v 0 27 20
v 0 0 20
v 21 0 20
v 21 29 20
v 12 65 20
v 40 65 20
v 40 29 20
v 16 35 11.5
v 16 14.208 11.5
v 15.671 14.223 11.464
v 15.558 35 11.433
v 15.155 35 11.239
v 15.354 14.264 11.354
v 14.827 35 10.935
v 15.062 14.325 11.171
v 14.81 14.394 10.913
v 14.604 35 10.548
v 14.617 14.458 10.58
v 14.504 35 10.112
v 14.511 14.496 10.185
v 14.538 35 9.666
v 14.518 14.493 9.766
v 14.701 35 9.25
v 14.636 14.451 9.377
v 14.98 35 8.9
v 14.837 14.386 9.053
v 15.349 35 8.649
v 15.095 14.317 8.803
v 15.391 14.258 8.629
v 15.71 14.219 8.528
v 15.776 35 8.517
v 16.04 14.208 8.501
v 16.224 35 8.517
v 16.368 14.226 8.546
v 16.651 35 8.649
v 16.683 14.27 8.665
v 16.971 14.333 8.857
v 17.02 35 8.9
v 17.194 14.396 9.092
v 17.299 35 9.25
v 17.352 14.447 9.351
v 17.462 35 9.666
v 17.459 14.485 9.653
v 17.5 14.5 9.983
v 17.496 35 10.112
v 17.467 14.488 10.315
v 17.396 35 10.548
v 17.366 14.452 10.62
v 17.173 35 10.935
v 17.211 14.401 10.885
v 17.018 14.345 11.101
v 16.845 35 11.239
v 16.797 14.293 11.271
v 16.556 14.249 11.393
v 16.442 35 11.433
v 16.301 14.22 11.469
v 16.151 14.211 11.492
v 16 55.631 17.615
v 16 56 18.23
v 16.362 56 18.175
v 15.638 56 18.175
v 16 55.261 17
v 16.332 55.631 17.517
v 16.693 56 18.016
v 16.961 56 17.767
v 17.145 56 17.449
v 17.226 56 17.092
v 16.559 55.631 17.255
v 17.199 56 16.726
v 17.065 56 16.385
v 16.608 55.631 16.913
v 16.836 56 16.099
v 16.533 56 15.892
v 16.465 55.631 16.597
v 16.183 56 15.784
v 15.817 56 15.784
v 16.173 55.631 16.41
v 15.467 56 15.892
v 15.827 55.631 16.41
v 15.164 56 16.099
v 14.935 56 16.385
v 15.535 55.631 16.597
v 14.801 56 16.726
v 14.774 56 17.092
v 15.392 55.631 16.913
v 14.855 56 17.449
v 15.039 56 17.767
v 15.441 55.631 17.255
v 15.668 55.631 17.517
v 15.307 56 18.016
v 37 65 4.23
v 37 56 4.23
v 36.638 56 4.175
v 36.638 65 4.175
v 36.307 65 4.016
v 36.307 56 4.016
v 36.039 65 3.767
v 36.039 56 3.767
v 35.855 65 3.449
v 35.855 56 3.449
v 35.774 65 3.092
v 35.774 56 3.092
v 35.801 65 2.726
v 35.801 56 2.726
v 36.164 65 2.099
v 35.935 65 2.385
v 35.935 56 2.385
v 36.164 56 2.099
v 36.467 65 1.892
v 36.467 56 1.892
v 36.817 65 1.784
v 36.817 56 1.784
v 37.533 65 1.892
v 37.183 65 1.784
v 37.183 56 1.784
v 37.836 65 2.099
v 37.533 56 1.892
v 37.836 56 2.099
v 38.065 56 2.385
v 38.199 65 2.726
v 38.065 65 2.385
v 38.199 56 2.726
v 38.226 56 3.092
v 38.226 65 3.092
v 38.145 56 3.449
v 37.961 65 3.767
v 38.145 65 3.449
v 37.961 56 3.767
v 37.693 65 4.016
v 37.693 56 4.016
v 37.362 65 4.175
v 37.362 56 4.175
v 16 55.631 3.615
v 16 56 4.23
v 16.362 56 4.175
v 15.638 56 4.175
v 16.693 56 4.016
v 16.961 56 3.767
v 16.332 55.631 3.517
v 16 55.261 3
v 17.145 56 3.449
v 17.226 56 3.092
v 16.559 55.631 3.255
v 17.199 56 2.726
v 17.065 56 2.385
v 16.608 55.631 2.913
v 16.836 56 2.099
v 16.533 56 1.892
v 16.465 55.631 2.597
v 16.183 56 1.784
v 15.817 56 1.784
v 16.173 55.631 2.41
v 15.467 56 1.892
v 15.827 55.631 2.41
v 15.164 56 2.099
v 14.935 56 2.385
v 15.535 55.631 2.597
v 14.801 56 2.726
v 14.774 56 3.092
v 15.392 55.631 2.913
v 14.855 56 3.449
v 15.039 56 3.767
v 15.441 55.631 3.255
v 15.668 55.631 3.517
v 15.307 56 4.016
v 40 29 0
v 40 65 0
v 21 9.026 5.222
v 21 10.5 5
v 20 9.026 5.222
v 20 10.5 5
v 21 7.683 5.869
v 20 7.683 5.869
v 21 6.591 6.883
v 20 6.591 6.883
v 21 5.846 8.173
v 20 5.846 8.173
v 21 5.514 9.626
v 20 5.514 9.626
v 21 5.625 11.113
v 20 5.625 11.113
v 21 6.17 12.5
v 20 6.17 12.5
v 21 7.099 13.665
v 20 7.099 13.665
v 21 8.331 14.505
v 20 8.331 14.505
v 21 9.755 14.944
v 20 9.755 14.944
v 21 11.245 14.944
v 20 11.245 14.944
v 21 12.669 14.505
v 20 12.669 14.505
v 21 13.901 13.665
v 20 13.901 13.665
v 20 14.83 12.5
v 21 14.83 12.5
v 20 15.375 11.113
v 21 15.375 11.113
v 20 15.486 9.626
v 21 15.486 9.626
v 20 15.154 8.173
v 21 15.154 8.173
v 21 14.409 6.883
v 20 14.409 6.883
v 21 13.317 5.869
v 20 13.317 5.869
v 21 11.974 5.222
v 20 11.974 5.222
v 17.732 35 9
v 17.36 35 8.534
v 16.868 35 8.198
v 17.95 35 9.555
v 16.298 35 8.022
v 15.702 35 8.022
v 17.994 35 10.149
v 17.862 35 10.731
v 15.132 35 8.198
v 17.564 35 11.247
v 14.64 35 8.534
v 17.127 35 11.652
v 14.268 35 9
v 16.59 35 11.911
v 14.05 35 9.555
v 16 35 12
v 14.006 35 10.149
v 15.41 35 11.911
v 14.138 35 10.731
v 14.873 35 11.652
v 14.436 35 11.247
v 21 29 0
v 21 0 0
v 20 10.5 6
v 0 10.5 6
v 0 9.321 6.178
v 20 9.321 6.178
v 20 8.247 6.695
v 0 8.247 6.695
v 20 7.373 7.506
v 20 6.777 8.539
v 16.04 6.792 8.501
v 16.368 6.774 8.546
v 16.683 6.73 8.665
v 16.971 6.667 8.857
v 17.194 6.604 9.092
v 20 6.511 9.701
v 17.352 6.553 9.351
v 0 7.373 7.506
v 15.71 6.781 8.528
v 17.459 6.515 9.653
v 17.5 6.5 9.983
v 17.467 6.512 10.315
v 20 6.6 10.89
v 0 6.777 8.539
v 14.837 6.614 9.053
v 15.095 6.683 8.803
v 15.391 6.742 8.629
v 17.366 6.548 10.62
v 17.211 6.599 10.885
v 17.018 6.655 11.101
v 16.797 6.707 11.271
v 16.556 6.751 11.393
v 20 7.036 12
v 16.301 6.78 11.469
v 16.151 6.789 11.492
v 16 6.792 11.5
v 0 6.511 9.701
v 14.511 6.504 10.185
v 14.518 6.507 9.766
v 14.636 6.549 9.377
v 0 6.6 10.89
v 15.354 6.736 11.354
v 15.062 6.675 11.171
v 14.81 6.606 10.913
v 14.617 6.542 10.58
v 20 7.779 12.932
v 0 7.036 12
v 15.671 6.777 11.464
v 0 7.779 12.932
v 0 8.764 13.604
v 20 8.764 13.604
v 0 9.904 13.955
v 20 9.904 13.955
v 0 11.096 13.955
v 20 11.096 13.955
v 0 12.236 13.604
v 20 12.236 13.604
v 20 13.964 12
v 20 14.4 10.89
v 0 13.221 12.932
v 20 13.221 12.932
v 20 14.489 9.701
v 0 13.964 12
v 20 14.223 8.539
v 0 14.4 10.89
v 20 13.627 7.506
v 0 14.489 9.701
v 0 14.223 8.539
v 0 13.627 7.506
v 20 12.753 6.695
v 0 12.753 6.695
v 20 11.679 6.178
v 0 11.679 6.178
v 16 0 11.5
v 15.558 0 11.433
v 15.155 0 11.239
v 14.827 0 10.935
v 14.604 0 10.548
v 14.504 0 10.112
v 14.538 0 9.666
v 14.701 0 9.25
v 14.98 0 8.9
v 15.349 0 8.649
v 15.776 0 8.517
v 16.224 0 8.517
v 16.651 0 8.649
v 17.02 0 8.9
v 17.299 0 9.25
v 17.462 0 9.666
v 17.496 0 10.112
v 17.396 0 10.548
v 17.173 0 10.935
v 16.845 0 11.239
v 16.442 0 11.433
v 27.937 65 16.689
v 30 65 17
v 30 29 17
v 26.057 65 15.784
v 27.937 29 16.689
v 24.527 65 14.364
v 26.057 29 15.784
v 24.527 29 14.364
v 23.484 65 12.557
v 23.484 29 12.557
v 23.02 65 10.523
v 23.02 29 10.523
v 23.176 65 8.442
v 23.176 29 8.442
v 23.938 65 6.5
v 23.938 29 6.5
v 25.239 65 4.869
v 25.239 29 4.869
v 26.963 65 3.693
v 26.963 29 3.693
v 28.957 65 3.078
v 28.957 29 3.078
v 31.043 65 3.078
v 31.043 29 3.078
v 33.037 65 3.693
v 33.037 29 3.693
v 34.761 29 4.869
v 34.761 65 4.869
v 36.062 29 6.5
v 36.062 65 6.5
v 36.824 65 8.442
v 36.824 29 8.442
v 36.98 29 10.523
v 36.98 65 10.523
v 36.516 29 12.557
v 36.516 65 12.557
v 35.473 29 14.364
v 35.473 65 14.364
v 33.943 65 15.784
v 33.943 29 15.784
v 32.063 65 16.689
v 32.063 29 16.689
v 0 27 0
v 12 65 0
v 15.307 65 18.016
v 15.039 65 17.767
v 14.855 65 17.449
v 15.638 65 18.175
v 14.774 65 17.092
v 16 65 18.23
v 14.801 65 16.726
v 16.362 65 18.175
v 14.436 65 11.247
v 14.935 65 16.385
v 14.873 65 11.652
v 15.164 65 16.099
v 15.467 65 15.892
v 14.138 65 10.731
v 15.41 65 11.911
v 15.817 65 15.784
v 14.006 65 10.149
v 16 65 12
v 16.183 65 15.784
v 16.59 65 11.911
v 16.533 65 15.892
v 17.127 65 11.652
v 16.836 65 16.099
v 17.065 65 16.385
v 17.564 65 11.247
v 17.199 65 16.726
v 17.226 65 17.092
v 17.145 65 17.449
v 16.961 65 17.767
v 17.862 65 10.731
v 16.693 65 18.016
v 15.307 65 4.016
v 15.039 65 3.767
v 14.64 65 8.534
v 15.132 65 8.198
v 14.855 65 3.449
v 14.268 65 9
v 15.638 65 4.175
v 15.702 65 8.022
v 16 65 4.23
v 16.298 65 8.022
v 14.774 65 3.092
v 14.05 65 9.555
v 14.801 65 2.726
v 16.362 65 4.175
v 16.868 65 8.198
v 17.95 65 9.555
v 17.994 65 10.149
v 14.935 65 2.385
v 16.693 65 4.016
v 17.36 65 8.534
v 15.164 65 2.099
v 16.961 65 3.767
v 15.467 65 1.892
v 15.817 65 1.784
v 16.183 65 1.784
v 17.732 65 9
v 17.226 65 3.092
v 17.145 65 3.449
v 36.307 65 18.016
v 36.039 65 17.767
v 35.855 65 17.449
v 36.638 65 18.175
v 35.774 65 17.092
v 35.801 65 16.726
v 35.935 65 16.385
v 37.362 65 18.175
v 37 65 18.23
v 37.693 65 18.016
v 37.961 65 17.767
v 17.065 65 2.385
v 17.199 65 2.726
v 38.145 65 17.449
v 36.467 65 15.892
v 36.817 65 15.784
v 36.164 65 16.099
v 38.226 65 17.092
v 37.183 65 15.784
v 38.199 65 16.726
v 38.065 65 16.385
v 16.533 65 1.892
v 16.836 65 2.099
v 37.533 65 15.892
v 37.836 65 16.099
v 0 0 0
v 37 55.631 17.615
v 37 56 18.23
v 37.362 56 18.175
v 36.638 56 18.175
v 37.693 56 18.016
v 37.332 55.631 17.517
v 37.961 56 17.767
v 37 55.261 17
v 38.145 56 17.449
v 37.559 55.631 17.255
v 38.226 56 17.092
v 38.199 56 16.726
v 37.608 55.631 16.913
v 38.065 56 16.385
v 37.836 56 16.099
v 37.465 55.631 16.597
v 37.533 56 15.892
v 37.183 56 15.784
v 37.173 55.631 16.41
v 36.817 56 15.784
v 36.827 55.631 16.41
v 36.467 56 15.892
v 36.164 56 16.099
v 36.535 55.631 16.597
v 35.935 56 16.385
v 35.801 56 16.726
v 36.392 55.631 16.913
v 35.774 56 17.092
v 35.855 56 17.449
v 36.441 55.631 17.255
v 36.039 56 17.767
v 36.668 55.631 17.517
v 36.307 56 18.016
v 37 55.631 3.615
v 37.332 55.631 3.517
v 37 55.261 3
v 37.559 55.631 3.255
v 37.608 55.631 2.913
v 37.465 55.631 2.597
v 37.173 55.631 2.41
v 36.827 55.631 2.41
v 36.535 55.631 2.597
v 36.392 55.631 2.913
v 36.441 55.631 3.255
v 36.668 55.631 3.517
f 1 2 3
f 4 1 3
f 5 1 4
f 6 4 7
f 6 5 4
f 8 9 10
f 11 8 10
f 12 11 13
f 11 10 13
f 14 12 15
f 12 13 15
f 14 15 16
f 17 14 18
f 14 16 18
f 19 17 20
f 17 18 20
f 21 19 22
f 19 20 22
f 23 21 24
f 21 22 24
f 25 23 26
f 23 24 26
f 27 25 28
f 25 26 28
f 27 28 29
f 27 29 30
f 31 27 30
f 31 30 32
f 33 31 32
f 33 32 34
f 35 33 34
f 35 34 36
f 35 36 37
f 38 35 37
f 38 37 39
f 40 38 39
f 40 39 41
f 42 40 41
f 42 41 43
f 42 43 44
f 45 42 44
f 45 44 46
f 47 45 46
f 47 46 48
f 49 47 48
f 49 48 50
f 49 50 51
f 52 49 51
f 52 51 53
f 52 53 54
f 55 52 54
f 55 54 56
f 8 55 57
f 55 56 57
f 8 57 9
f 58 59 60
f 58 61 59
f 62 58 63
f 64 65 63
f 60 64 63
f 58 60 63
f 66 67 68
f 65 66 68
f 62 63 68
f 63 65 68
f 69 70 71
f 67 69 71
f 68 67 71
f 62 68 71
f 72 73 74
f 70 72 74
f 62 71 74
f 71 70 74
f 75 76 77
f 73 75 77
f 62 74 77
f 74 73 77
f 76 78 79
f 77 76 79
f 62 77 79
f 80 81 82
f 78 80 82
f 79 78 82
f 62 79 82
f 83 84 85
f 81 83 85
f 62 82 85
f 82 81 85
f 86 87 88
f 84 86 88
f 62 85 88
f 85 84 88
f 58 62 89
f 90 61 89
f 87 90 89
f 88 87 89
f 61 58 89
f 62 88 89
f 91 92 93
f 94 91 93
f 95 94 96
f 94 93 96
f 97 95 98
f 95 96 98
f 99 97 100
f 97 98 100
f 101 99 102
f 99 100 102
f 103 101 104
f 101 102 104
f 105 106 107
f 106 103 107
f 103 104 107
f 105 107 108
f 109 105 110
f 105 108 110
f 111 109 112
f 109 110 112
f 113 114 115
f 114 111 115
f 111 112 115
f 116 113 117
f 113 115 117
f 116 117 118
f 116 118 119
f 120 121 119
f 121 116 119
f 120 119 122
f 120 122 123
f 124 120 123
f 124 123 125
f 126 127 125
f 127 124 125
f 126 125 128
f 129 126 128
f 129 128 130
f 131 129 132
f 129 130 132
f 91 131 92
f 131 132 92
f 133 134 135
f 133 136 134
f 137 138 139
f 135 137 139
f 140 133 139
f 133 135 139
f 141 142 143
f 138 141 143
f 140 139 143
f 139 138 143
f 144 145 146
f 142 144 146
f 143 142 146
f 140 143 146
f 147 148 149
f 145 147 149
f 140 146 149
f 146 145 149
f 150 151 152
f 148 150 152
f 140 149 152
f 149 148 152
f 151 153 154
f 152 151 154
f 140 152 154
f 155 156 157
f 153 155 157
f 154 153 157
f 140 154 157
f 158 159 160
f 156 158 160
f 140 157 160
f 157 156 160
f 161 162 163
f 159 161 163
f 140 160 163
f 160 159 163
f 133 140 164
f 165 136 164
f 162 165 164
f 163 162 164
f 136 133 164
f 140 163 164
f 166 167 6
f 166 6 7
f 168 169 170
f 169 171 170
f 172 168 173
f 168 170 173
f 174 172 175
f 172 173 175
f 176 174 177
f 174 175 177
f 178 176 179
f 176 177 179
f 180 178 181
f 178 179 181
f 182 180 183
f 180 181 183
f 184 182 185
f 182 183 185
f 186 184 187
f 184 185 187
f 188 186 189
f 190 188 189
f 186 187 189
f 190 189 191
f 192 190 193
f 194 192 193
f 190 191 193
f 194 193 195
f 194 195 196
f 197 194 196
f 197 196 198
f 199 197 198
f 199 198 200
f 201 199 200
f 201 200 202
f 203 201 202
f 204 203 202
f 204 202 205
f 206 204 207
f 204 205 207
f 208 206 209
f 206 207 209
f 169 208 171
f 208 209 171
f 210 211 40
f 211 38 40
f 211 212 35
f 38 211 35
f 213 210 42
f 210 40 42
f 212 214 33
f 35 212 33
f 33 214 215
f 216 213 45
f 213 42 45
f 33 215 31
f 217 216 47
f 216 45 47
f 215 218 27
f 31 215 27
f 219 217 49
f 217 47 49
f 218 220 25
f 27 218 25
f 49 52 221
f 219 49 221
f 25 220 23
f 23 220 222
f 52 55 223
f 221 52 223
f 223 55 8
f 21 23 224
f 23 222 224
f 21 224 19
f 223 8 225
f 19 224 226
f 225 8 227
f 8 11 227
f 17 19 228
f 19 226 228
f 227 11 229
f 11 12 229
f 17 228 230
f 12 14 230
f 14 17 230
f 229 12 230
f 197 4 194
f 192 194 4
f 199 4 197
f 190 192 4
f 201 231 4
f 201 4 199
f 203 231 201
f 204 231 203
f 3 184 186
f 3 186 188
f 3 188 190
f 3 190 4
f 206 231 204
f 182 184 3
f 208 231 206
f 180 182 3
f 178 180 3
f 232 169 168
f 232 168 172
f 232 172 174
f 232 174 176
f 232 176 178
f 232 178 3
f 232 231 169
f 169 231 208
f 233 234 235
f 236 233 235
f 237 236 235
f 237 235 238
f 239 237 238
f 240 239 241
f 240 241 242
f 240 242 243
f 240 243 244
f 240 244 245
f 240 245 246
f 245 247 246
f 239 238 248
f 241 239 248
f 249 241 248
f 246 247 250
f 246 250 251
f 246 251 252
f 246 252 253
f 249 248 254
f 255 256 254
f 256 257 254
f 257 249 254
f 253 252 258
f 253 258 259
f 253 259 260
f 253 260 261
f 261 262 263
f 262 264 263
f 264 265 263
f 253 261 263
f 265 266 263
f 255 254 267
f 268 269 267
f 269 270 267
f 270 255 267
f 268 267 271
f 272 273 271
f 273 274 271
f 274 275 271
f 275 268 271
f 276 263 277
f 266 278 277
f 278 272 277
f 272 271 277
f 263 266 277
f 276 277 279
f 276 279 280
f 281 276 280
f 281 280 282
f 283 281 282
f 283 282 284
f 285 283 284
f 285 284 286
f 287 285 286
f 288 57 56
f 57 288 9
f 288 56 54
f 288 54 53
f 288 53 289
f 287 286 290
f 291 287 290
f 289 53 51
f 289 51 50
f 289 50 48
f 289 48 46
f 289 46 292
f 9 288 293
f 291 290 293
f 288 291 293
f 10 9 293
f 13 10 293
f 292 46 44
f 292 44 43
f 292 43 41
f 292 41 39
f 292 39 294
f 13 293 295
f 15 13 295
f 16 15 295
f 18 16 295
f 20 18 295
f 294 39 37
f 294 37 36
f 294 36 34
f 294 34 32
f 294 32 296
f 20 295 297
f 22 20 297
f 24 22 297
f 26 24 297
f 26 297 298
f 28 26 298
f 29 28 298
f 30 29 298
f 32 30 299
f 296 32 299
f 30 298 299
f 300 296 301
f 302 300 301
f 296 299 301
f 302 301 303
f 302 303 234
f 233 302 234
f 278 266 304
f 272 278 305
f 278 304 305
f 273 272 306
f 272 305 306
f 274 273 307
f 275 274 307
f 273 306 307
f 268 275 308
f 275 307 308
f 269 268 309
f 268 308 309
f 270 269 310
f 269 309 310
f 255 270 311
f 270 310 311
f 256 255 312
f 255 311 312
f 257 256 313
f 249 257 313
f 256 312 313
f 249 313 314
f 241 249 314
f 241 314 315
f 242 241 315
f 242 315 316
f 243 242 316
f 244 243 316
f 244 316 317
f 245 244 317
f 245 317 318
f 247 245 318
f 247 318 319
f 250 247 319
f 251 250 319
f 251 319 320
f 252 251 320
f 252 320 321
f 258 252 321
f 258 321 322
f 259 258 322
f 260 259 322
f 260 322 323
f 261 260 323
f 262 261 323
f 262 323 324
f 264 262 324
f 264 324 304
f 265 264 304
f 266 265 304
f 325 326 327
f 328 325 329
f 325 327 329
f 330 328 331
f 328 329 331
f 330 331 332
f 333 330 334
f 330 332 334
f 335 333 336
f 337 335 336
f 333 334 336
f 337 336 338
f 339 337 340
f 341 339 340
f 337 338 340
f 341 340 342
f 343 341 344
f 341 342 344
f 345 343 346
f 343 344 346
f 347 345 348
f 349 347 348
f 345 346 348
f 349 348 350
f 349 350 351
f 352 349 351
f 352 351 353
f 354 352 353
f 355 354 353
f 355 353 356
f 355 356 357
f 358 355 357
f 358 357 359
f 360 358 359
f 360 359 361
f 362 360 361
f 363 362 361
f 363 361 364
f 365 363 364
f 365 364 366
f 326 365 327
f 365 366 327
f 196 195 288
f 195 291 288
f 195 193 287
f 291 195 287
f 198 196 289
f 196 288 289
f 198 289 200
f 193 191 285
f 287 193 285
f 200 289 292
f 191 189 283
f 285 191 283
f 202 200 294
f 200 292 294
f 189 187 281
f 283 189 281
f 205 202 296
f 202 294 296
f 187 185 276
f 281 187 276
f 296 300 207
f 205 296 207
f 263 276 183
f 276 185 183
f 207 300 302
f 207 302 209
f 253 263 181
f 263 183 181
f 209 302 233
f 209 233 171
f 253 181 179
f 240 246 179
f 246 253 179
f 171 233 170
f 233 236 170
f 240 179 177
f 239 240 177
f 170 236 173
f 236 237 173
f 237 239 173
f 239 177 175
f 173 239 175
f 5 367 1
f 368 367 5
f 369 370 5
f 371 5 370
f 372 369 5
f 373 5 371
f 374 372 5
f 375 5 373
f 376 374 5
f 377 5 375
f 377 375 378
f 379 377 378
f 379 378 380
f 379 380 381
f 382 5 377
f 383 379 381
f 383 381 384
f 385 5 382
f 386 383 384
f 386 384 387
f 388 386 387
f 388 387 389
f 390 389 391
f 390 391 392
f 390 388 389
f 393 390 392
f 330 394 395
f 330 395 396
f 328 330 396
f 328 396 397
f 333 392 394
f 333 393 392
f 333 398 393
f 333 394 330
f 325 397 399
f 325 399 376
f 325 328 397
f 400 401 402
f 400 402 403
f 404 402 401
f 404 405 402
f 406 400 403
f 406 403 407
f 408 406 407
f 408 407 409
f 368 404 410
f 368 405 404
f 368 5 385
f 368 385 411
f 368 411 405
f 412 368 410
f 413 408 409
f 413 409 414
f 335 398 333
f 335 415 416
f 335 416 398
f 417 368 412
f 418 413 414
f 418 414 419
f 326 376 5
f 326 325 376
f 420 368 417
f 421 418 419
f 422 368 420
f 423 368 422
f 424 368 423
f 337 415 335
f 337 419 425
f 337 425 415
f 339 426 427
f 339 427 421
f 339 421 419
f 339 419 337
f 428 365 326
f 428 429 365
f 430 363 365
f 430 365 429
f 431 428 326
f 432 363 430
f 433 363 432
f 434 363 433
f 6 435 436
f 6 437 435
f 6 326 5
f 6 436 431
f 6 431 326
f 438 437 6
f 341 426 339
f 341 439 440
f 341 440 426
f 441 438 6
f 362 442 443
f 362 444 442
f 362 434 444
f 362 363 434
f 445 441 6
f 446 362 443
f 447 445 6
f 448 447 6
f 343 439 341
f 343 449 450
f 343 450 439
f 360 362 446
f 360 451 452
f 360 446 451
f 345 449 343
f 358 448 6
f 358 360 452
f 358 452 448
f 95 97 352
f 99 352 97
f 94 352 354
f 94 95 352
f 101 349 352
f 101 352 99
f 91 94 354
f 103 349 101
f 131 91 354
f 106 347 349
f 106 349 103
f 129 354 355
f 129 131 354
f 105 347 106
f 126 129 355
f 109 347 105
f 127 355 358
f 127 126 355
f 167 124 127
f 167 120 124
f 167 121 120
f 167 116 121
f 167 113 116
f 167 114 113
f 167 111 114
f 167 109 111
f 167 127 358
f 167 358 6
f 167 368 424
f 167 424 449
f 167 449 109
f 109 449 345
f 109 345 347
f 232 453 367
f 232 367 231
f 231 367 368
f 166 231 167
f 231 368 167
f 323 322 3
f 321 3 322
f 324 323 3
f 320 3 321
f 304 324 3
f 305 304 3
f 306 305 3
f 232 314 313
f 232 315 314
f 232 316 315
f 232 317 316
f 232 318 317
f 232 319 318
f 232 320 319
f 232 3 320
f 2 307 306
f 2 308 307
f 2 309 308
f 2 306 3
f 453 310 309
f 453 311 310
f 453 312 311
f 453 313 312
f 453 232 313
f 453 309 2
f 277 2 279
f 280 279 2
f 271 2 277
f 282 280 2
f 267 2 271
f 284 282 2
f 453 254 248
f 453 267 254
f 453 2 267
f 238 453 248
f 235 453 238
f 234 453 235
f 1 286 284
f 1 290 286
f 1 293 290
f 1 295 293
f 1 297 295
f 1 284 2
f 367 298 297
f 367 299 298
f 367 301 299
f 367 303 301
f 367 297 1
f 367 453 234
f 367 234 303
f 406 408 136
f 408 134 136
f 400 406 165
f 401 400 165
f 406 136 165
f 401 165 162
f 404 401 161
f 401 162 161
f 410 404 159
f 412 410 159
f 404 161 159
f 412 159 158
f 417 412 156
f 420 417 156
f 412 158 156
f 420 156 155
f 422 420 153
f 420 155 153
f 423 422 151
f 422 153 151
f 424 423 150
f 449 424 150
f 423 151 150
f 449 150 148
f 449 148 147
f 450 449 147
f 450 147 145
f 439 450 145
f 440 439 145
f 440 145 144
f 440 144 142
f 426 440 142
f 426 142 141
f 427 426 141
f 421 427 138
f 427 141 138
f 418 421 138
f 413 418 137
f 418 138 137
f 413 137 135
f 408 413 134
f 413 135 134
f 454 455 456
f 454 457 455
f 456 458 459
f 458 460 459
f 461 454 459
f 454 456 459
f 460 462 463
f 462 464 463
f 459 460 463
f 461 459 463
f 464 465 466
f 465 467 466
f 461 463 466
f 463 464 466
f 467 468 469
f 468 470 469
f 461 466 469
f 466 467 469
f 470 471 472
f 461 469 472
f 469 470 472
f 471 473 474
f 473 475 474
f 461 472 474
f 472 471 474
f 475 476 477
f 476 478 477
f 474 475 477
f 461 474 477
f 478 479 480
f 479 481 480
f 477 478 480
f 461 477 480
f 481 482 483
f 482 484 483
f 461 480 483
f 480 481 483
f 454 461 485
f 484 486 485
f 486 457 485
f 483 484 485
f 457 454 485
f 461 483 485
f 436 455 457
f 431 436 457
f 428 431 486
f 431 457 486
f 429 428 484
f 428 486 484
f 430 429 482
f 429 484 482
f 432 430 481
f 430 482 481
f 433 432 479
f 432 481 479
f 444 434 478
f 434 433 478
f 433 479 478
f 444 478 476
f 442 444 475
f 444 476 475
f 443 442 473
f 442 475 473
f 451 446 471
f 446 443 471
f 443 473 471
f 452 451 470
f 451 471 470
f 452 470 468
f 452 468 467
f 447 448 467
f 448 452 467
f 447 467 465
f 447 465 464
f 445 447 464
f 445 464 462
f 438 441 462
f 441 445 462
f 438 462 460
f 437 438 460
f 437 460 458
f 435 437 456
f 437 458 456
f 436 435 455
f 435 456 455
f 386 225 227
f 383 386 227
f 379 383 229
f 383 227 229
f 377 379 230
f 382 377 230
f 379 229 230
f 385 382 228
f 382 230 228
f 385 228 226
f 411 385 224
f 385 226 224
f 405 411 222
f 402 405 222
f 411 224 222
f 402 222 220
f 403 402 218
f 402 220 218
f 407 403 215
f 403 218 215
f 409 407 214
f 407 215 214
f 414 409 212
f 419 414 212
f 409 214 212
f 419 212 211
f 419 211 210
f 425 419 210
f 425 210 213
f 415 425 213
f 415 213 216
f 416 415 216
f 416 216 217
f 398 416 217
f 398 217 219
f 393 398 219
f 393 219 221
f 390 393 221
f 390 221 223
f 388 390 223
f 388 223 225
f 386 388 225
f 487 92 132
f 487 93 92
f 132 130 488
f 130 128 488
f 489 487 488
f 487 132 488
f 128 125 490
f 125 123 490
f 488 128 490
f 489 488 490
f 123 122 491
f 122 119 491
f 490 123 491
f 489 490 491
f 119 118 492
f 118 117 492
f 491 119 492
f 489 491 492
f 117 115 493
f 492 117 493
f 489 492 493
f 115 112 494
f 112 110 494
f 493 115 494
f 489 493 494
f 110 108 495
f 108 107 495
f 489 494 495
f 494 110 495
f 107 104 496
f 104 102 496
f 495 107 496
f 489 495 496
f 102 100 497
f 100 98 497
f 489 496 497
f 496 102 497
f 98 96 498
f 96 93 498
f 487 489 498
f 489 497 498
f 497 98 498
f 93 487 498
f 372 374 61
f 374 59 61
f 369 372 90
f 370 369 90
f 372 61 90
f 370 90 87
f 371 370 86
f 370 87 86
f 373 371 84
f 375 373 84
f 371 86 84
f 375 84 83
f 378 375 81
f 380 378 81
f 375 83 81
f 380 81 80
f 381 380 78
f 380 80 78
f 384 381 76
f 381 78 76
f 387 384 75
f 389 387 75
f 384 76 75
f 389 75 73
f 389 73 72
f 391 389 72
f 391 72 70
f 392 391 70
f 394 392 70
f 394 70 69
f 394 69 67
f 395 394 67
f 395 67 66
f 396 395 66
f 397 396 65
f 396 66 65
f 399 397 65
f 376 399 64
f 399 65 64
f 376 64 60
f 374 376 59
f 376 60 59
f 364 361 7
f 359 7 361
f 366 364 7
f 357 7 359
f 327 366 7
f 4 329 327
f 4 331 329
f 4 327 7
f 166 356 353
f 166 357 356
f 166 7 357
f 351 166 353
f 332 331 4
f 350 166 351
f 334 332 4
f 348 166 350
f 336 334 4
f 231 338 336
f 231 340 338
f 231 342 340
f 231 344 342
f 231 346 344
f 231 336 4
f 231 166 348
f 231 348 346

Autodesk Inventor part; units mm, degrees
ref_plane "XY Plane" through (0, 0, 0) normal (0, 0, 1) x (1, 0, 0)
sketch "Skizze1" plane through (0, 0, 0) normal (0, 0, 1) x (1, 0, 0)
  line L0 (0, 0) -> (0, 27)
  line L1 (0, 27) -> (12, 65)
  line L2 (12, 65) -> (40, 65)
  line L3 (40, 65) -> (40, 29)
  line L4 (40, 29) -> (21, 29)
  line L5 (21, 29) -> (21, 0)
  line L6 (21, 0) -> (0, 0)
  dimension "d0" = 65
  dimension "d1" = 21
  dimension "d2" = 29
  dimension "d3" = 38
  dimension "d4" = 28
  dimension "d5" = 12
extrude "Extrusion1" add sketch "Skizze1" along normal blind 20
sketch "Skizze3" plane through (12, 65, 0) normal (0, 1, 0) x (1, 0, 0)
  line L0 (0, 0) -> (0, -20) projected
  line L1 (28, 0) -> (28, -20) projected
  point P0 (-12, 0)
  point P1 (18, -10)
  point P2 (28, -10)
  dimension "d16" = 10
hole "Bohrung2" at (30, 65, 10) direction (0, -1, 0) diameter 14 end through all
sketch "Skizze4" plane through (12, 65, 0) normal (0, 1, 0) x (1, 0, 0)
  line L0 (0, 0) -> (0, -20) projected
  line L1 (28, 0) -> (28, -20) projected
  point P0 (-12, 0)
  point P1 (4, -10)
  point P2 (28, -10)
  dimension "d24" = 4
hole "Bohrung3" at (16, 65, 10) direction (0, -1, 0) diameter 3 depth 65 counterbore diameter 4 counterbore depth 30
sketch "Skizze5" plane through (21, 0, 0) normal (1, 0, 0) x (0, 0, -1)
  line L0 (0, 0) -> (-20, 0) projected
  point P0 (-10, 10.5)
  point P1 (-10, 0)
  dimension "d32" = 10.5
hole "Bohrung4" at (21, 10.5, 10) direction (-1, 0, 0) diameter 8 depth 21 counterbore diameter 10 counterbore depth 1
ref_plane "Arbeitsebene1" through (0, 12, 0) normal (0, 1, 0) x (-1, 0, 0)
sketch "Skizze8" plane through (12, 65, 0) normal (0, 1, 0) x (1, 0, 0)
  circle A0 centre (4, -10) radius 2 projected
  circle A1 centre (18, -10) radius 7 projected
  line L0 (28, 0) -> (0, 0) projected
  line L1 (0, 0) -> (0, -20) projected
  line L2 (28, -20) -> (0, -20) projected
  line L3 (28, 0) -> (28, -20) projected
  line L4 (4, -10) -> (4, -3) construction
  line L5 (4, -10) -> (4, -17) construction
  line L6 (18, -10) -> (9, -10) construction
  line L7 (9, 0) -> (9, -20) projected
  point P0 (-12, 0)
  dimension "d57" = 14
hole "Bohrung7" at (16, 65, 17) at (16, 65, 3) direction (0, -1, 0) diameter 2.459 depth 9 tip angle 118 thread size "M3x0.5" class "6H" standard "ISO Metric profile"
ref_plane "Arbeitsebene2" through (26.5, 0, 0) normal (1, 0, 0) x (0, 1, 0)
mirror "Spiegeln2" about plane through (26.5, 0, 0) normal (1, 0, 0) of "Bohrung7"
properties part number "MotorBlock" material "Stahl, galvanisiert"
